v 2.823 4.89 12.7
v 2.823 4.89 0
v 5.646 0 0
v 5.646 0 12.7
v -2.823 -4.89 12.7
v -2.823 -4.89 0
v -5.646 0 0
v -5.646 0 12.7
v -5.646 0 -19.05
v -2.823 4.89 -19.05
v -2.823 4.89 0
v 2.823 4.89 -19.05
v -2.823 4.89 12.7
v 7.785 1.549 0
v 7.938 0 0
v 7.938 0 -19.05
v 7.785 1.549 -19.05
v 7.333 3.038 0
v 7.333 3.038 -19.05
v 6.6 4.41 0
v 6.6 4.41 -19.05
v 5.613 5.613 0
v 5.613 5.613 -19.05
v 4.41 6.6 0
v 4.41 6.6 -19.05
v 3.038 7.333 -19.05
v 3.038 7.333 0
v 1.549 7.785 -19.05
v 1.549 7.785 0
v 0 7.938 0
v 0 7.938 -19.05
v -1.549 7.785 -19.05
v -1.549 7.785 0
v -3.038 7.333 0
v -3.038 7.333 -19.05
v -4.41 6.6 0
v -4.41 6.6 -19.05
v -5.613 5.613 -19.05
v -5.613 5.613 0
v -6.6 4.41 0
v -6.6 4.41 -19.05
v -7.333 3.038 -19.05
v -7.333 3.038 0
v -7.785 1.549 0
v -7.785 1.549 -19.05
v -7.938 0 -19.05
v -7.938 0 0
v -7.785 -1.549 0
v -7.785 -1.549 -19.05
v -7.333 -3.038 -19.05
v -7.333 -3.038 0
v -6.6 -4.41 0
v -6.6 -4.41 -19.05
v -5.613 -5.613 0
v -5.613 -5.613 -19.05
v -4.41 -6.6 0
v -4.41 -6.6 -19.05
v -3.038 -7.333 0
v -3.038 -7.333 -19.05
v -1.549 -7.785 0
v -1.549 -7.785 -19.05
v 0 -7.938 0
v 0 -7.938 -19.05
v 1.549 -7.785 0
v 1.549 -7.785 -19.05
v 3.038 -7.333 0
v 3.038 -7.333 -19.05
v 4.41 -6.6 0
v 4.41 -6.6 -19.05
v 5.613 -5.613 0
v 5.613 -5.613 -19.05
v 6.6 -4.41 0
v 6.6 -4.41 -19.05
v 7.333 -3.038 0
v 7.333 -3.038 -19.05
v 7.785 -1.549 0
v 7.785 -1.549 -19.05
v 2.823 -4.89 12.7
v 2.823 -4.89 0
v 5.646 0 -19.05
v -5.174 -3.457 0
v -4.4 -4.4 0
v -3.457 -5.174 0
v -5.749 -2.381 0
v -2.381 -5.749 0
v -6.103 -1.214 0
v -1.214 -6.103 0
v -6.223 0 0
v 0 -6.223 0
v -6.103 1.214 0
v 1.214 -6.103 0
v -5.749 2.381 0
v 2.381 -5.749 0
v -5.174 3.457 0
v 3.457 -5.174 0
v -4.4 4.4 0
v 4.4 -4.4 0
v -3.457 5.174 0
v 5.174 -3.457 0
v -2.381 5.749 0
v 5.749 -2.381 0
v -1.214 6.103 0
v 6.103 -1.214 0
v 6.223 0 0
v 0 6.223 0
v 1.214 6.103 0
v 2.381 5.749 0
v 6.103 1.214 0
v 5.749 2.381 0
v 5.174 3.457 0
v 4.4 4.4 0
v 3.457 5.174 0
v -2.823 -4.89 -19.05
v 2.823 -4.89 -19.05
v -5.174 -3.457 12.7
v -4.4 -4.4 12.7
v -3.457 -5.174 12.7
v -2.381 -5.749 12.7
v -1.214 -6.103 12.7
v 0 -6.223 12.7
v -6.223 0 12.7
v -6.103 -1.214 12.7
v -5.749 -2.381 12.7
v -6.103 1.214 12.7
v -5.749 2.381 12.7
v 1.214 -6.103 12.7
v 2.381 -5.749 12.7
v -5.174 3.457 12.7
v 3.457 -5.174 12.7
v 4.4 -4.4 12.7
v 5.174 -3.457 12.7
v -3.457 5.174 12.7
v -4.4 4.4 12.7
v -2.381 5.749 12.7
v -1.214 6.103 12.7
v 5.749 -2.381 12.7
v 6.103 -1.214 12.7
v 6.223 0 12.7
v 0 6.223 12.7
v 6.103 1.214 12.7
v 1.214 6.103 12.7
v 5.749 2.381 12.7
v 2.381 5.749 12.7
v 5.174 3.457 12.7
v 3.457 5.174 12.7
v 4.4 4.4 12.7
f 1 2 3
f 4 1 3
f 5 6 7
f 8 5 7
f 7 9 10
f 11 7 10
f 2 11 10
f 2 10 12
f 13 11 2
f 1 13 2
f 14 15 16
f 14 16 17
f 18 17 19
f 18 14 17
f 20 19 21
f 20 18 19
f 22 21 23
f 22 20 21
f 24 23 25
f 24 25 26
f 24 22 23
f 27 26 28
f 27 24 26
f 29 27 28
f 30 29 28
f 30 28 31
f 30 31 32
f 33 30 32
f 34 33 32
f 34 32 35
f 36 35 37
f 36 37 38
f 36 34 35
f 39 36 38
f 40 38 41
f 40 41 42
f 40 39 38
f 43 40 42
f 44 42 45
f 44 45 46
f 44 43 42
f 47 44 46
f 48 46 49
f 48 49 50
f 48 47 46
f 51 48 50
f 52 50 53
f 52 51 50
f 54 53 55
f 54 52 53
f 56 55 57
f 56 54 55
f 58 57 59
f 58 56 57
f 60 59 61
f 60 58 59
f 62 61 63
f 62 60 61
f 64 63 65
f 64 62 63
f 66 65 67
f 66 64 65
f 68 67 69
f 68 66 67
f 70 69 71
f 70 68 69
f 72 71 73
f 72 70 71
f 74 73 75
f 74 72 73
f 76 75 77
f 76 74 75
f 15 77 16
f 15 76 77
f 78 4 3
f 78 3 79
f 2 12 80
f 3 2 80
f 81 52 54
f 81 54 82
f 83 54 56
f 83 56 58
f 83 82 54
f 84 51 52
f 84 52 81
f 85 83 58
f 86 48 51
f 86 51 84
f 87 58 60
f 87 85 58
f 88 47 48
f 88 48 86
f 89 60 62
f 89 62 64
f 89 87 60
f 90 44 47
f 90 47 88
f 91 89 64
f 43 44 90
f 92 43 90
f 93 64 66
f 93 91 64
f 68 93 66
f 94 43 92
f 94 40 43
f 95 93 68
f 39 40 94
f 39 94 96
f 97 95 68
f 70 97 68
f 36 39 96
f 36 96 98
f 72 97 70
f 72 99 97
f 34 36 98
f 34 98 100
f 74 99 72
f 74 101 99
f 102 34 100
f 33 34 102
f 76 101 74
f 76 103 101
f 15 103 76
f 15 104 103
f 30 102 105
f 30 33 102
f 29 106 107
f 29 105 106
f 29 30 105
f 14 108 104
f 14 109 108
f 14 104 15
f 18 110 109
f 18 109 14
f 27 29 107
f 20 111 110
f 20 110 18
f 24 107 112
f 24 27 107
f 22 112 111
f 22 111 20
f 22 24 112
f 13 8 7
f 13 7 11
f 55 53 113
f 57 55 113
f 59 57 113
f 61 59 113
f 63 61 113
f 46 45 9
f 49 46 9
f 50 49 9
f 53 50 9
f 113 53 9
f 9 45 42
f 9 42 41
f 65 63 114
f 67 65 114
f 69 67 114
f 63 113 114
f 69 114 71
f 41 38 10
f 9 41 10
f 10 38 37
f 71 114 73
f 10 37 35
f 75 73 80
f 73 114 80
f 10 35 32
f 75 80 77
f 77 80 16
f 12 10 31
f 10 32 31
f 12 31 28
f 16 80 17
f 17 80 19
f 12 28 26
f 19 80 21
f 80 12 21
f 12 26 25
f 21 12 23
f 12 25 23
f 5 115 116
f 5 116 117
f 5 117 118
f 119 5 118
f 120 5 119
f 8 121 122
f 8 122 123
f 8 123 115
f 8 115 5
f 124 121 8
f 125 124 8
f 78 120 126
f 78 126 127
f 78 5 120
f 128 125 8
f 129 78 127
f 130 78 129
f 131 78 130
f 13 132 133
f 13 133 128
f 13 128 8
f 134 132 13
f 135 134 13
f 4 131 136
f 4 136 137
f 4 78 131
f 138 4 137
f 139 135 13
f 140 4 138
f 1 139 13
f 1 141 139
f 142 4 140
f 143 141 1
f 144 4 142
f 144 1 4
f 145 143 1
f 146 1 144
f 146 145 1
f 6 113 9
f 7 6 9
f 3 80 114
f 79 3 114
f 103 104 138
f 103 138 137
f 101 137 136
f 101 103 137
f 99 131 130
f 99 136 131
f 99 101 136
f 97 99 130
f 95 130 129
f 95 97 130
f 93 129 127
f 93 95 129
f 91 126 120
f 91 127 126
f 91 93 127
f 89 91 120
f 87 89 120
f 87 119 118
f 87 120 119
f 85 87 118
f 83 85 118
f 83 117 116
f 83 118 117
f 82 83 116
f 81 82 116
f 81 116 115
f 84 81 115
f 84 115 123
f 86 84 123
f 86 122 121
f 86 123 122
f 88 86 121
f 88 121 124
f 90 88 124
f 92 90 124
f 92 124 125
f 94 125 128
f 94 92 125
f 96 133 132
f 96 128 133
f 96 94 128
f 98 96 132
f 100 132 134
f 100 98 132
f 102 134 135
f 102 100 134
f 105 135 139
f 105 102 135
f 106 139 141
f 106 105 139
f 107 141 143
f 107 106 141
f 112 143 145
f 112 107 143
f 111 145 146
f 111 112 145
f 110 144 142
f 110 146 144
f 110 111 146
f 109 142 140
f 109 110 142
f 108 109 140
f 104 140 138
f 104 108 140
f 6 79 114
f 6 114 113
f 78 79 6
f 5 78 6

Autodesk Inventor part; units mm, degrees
ref_plane "YZ Plane" through (0, 0, 0) normal (1, 0, 0) x (0, 1, 0)
ref_plane "XZ Plane" through (0, 0, 0) normal (0, 1, 0) x (-1, 0, 0)
ref_plane "XY Plane" through (0, 0, 0) normal (0, 0, 1) x (1, 0, 0)
sketch "Sketch1" plane through (0, 0, 0) normal (0, 0, 1) x (1, 0, 0)
  line L0 (2.7496, 4.7625) -> (5.4993, 0)
  line L1 (5.4993, 0) -> (2.7496, -4.7625)
  line L2 (2.7496, -4.7625) -> (-2.7496, -4.7625)
  line L3 (-2.7496, -4.7625) -> (-5.4993, 0)
  line L4 (-5.4993, 0) -> (-2.7496, 4.7625)
  line L5 (-2.7496, 4.7625) -> (2.7496, 4.7625)
  circle A0 centre (0, 0) radius 7.9375
  circle A1 centre (0, 0) radius 5.4993 construction
  dimension "d0" = 9.525
  dimension "d2" = 15.875
  dimension "d3" = 2.4382
extrude "Extrusion1" add sketch "Sketch1" against normal blind 19.05
thicken "Thicken Hex" operation add thickness 0.127 both sides no extend neighbours yes toward (-0.8660254, 0.5, 0) faces at (-4.5827, 1.5875, -6.35) (-3.6662, -3.175, -6.35) (0.9165, -4.7625, -6.35) (-0.9165, 4.7625, -6.35) (3.6662, 3.175, -6.35) (4.5827, -1.5875, -6.35)
sketch "Sketch3" plane through (0, 0, 0) normal (0, 0, 1) x (1, 0, 0)
  line L0 (5.6459, 0) -> (2.823, -4.8895)
  line L1 (2.823, -4.8895) -> (-2.823, -4.8895)
  line L2 (-2.823, -4.8895) -> (-5.6459, 0)
  line L3 (-5.6459, 0) -> (-2.823, 4.8895)
  line L4 (-2.823, 4.8895) -> (2.823, 4.8895)
  line L5 (2.823, 4.8895) -> (5.6459, 0)
  line L6 (2.823, 4.8895) -> (5.6459, 0) projected
  circle A0 centre (0, 0) radius 6.35
  dimension "d10" = 12.7
extrude "Extrusion2" add sketch "Sketch3" along normal blind 12.7
thicken "Thicken2" operation add thickness 0.127 both sides no extend neighbours yes toward (-0.9967573, 0.0804666, 0) faces at (6.3294, -0.511, 8.4667)
equation "\"d0\" = hexSize"
equation "\"d2\" = exteriorDiameter"
equation "\"d4\" = length"
equation "\"d6\" = printSpacing"
equation "\"d7\" = printSpacing"
equation "\"d10\" = baseBushingDiameter"
equation "\"d8\" = baseBushingLength"
equation "\"d11\" = printSpacing"
equation "\"d12\" = printSpacing"
equation "\"hexSize\" = 9.525"
equation "\"exteriorDiameter\" = 15.875"
equation "\"length\" = 19.05"
equation "\"printSpacing\" = 0.127"
equation "\"baseBushingDiameter\" = 12.7"
equation "\"baseBushingLength\" = 12.7"
properties part number "3_8x5_8x3_4-hexBearingEndCap" material "PC/ABS Plastic"
